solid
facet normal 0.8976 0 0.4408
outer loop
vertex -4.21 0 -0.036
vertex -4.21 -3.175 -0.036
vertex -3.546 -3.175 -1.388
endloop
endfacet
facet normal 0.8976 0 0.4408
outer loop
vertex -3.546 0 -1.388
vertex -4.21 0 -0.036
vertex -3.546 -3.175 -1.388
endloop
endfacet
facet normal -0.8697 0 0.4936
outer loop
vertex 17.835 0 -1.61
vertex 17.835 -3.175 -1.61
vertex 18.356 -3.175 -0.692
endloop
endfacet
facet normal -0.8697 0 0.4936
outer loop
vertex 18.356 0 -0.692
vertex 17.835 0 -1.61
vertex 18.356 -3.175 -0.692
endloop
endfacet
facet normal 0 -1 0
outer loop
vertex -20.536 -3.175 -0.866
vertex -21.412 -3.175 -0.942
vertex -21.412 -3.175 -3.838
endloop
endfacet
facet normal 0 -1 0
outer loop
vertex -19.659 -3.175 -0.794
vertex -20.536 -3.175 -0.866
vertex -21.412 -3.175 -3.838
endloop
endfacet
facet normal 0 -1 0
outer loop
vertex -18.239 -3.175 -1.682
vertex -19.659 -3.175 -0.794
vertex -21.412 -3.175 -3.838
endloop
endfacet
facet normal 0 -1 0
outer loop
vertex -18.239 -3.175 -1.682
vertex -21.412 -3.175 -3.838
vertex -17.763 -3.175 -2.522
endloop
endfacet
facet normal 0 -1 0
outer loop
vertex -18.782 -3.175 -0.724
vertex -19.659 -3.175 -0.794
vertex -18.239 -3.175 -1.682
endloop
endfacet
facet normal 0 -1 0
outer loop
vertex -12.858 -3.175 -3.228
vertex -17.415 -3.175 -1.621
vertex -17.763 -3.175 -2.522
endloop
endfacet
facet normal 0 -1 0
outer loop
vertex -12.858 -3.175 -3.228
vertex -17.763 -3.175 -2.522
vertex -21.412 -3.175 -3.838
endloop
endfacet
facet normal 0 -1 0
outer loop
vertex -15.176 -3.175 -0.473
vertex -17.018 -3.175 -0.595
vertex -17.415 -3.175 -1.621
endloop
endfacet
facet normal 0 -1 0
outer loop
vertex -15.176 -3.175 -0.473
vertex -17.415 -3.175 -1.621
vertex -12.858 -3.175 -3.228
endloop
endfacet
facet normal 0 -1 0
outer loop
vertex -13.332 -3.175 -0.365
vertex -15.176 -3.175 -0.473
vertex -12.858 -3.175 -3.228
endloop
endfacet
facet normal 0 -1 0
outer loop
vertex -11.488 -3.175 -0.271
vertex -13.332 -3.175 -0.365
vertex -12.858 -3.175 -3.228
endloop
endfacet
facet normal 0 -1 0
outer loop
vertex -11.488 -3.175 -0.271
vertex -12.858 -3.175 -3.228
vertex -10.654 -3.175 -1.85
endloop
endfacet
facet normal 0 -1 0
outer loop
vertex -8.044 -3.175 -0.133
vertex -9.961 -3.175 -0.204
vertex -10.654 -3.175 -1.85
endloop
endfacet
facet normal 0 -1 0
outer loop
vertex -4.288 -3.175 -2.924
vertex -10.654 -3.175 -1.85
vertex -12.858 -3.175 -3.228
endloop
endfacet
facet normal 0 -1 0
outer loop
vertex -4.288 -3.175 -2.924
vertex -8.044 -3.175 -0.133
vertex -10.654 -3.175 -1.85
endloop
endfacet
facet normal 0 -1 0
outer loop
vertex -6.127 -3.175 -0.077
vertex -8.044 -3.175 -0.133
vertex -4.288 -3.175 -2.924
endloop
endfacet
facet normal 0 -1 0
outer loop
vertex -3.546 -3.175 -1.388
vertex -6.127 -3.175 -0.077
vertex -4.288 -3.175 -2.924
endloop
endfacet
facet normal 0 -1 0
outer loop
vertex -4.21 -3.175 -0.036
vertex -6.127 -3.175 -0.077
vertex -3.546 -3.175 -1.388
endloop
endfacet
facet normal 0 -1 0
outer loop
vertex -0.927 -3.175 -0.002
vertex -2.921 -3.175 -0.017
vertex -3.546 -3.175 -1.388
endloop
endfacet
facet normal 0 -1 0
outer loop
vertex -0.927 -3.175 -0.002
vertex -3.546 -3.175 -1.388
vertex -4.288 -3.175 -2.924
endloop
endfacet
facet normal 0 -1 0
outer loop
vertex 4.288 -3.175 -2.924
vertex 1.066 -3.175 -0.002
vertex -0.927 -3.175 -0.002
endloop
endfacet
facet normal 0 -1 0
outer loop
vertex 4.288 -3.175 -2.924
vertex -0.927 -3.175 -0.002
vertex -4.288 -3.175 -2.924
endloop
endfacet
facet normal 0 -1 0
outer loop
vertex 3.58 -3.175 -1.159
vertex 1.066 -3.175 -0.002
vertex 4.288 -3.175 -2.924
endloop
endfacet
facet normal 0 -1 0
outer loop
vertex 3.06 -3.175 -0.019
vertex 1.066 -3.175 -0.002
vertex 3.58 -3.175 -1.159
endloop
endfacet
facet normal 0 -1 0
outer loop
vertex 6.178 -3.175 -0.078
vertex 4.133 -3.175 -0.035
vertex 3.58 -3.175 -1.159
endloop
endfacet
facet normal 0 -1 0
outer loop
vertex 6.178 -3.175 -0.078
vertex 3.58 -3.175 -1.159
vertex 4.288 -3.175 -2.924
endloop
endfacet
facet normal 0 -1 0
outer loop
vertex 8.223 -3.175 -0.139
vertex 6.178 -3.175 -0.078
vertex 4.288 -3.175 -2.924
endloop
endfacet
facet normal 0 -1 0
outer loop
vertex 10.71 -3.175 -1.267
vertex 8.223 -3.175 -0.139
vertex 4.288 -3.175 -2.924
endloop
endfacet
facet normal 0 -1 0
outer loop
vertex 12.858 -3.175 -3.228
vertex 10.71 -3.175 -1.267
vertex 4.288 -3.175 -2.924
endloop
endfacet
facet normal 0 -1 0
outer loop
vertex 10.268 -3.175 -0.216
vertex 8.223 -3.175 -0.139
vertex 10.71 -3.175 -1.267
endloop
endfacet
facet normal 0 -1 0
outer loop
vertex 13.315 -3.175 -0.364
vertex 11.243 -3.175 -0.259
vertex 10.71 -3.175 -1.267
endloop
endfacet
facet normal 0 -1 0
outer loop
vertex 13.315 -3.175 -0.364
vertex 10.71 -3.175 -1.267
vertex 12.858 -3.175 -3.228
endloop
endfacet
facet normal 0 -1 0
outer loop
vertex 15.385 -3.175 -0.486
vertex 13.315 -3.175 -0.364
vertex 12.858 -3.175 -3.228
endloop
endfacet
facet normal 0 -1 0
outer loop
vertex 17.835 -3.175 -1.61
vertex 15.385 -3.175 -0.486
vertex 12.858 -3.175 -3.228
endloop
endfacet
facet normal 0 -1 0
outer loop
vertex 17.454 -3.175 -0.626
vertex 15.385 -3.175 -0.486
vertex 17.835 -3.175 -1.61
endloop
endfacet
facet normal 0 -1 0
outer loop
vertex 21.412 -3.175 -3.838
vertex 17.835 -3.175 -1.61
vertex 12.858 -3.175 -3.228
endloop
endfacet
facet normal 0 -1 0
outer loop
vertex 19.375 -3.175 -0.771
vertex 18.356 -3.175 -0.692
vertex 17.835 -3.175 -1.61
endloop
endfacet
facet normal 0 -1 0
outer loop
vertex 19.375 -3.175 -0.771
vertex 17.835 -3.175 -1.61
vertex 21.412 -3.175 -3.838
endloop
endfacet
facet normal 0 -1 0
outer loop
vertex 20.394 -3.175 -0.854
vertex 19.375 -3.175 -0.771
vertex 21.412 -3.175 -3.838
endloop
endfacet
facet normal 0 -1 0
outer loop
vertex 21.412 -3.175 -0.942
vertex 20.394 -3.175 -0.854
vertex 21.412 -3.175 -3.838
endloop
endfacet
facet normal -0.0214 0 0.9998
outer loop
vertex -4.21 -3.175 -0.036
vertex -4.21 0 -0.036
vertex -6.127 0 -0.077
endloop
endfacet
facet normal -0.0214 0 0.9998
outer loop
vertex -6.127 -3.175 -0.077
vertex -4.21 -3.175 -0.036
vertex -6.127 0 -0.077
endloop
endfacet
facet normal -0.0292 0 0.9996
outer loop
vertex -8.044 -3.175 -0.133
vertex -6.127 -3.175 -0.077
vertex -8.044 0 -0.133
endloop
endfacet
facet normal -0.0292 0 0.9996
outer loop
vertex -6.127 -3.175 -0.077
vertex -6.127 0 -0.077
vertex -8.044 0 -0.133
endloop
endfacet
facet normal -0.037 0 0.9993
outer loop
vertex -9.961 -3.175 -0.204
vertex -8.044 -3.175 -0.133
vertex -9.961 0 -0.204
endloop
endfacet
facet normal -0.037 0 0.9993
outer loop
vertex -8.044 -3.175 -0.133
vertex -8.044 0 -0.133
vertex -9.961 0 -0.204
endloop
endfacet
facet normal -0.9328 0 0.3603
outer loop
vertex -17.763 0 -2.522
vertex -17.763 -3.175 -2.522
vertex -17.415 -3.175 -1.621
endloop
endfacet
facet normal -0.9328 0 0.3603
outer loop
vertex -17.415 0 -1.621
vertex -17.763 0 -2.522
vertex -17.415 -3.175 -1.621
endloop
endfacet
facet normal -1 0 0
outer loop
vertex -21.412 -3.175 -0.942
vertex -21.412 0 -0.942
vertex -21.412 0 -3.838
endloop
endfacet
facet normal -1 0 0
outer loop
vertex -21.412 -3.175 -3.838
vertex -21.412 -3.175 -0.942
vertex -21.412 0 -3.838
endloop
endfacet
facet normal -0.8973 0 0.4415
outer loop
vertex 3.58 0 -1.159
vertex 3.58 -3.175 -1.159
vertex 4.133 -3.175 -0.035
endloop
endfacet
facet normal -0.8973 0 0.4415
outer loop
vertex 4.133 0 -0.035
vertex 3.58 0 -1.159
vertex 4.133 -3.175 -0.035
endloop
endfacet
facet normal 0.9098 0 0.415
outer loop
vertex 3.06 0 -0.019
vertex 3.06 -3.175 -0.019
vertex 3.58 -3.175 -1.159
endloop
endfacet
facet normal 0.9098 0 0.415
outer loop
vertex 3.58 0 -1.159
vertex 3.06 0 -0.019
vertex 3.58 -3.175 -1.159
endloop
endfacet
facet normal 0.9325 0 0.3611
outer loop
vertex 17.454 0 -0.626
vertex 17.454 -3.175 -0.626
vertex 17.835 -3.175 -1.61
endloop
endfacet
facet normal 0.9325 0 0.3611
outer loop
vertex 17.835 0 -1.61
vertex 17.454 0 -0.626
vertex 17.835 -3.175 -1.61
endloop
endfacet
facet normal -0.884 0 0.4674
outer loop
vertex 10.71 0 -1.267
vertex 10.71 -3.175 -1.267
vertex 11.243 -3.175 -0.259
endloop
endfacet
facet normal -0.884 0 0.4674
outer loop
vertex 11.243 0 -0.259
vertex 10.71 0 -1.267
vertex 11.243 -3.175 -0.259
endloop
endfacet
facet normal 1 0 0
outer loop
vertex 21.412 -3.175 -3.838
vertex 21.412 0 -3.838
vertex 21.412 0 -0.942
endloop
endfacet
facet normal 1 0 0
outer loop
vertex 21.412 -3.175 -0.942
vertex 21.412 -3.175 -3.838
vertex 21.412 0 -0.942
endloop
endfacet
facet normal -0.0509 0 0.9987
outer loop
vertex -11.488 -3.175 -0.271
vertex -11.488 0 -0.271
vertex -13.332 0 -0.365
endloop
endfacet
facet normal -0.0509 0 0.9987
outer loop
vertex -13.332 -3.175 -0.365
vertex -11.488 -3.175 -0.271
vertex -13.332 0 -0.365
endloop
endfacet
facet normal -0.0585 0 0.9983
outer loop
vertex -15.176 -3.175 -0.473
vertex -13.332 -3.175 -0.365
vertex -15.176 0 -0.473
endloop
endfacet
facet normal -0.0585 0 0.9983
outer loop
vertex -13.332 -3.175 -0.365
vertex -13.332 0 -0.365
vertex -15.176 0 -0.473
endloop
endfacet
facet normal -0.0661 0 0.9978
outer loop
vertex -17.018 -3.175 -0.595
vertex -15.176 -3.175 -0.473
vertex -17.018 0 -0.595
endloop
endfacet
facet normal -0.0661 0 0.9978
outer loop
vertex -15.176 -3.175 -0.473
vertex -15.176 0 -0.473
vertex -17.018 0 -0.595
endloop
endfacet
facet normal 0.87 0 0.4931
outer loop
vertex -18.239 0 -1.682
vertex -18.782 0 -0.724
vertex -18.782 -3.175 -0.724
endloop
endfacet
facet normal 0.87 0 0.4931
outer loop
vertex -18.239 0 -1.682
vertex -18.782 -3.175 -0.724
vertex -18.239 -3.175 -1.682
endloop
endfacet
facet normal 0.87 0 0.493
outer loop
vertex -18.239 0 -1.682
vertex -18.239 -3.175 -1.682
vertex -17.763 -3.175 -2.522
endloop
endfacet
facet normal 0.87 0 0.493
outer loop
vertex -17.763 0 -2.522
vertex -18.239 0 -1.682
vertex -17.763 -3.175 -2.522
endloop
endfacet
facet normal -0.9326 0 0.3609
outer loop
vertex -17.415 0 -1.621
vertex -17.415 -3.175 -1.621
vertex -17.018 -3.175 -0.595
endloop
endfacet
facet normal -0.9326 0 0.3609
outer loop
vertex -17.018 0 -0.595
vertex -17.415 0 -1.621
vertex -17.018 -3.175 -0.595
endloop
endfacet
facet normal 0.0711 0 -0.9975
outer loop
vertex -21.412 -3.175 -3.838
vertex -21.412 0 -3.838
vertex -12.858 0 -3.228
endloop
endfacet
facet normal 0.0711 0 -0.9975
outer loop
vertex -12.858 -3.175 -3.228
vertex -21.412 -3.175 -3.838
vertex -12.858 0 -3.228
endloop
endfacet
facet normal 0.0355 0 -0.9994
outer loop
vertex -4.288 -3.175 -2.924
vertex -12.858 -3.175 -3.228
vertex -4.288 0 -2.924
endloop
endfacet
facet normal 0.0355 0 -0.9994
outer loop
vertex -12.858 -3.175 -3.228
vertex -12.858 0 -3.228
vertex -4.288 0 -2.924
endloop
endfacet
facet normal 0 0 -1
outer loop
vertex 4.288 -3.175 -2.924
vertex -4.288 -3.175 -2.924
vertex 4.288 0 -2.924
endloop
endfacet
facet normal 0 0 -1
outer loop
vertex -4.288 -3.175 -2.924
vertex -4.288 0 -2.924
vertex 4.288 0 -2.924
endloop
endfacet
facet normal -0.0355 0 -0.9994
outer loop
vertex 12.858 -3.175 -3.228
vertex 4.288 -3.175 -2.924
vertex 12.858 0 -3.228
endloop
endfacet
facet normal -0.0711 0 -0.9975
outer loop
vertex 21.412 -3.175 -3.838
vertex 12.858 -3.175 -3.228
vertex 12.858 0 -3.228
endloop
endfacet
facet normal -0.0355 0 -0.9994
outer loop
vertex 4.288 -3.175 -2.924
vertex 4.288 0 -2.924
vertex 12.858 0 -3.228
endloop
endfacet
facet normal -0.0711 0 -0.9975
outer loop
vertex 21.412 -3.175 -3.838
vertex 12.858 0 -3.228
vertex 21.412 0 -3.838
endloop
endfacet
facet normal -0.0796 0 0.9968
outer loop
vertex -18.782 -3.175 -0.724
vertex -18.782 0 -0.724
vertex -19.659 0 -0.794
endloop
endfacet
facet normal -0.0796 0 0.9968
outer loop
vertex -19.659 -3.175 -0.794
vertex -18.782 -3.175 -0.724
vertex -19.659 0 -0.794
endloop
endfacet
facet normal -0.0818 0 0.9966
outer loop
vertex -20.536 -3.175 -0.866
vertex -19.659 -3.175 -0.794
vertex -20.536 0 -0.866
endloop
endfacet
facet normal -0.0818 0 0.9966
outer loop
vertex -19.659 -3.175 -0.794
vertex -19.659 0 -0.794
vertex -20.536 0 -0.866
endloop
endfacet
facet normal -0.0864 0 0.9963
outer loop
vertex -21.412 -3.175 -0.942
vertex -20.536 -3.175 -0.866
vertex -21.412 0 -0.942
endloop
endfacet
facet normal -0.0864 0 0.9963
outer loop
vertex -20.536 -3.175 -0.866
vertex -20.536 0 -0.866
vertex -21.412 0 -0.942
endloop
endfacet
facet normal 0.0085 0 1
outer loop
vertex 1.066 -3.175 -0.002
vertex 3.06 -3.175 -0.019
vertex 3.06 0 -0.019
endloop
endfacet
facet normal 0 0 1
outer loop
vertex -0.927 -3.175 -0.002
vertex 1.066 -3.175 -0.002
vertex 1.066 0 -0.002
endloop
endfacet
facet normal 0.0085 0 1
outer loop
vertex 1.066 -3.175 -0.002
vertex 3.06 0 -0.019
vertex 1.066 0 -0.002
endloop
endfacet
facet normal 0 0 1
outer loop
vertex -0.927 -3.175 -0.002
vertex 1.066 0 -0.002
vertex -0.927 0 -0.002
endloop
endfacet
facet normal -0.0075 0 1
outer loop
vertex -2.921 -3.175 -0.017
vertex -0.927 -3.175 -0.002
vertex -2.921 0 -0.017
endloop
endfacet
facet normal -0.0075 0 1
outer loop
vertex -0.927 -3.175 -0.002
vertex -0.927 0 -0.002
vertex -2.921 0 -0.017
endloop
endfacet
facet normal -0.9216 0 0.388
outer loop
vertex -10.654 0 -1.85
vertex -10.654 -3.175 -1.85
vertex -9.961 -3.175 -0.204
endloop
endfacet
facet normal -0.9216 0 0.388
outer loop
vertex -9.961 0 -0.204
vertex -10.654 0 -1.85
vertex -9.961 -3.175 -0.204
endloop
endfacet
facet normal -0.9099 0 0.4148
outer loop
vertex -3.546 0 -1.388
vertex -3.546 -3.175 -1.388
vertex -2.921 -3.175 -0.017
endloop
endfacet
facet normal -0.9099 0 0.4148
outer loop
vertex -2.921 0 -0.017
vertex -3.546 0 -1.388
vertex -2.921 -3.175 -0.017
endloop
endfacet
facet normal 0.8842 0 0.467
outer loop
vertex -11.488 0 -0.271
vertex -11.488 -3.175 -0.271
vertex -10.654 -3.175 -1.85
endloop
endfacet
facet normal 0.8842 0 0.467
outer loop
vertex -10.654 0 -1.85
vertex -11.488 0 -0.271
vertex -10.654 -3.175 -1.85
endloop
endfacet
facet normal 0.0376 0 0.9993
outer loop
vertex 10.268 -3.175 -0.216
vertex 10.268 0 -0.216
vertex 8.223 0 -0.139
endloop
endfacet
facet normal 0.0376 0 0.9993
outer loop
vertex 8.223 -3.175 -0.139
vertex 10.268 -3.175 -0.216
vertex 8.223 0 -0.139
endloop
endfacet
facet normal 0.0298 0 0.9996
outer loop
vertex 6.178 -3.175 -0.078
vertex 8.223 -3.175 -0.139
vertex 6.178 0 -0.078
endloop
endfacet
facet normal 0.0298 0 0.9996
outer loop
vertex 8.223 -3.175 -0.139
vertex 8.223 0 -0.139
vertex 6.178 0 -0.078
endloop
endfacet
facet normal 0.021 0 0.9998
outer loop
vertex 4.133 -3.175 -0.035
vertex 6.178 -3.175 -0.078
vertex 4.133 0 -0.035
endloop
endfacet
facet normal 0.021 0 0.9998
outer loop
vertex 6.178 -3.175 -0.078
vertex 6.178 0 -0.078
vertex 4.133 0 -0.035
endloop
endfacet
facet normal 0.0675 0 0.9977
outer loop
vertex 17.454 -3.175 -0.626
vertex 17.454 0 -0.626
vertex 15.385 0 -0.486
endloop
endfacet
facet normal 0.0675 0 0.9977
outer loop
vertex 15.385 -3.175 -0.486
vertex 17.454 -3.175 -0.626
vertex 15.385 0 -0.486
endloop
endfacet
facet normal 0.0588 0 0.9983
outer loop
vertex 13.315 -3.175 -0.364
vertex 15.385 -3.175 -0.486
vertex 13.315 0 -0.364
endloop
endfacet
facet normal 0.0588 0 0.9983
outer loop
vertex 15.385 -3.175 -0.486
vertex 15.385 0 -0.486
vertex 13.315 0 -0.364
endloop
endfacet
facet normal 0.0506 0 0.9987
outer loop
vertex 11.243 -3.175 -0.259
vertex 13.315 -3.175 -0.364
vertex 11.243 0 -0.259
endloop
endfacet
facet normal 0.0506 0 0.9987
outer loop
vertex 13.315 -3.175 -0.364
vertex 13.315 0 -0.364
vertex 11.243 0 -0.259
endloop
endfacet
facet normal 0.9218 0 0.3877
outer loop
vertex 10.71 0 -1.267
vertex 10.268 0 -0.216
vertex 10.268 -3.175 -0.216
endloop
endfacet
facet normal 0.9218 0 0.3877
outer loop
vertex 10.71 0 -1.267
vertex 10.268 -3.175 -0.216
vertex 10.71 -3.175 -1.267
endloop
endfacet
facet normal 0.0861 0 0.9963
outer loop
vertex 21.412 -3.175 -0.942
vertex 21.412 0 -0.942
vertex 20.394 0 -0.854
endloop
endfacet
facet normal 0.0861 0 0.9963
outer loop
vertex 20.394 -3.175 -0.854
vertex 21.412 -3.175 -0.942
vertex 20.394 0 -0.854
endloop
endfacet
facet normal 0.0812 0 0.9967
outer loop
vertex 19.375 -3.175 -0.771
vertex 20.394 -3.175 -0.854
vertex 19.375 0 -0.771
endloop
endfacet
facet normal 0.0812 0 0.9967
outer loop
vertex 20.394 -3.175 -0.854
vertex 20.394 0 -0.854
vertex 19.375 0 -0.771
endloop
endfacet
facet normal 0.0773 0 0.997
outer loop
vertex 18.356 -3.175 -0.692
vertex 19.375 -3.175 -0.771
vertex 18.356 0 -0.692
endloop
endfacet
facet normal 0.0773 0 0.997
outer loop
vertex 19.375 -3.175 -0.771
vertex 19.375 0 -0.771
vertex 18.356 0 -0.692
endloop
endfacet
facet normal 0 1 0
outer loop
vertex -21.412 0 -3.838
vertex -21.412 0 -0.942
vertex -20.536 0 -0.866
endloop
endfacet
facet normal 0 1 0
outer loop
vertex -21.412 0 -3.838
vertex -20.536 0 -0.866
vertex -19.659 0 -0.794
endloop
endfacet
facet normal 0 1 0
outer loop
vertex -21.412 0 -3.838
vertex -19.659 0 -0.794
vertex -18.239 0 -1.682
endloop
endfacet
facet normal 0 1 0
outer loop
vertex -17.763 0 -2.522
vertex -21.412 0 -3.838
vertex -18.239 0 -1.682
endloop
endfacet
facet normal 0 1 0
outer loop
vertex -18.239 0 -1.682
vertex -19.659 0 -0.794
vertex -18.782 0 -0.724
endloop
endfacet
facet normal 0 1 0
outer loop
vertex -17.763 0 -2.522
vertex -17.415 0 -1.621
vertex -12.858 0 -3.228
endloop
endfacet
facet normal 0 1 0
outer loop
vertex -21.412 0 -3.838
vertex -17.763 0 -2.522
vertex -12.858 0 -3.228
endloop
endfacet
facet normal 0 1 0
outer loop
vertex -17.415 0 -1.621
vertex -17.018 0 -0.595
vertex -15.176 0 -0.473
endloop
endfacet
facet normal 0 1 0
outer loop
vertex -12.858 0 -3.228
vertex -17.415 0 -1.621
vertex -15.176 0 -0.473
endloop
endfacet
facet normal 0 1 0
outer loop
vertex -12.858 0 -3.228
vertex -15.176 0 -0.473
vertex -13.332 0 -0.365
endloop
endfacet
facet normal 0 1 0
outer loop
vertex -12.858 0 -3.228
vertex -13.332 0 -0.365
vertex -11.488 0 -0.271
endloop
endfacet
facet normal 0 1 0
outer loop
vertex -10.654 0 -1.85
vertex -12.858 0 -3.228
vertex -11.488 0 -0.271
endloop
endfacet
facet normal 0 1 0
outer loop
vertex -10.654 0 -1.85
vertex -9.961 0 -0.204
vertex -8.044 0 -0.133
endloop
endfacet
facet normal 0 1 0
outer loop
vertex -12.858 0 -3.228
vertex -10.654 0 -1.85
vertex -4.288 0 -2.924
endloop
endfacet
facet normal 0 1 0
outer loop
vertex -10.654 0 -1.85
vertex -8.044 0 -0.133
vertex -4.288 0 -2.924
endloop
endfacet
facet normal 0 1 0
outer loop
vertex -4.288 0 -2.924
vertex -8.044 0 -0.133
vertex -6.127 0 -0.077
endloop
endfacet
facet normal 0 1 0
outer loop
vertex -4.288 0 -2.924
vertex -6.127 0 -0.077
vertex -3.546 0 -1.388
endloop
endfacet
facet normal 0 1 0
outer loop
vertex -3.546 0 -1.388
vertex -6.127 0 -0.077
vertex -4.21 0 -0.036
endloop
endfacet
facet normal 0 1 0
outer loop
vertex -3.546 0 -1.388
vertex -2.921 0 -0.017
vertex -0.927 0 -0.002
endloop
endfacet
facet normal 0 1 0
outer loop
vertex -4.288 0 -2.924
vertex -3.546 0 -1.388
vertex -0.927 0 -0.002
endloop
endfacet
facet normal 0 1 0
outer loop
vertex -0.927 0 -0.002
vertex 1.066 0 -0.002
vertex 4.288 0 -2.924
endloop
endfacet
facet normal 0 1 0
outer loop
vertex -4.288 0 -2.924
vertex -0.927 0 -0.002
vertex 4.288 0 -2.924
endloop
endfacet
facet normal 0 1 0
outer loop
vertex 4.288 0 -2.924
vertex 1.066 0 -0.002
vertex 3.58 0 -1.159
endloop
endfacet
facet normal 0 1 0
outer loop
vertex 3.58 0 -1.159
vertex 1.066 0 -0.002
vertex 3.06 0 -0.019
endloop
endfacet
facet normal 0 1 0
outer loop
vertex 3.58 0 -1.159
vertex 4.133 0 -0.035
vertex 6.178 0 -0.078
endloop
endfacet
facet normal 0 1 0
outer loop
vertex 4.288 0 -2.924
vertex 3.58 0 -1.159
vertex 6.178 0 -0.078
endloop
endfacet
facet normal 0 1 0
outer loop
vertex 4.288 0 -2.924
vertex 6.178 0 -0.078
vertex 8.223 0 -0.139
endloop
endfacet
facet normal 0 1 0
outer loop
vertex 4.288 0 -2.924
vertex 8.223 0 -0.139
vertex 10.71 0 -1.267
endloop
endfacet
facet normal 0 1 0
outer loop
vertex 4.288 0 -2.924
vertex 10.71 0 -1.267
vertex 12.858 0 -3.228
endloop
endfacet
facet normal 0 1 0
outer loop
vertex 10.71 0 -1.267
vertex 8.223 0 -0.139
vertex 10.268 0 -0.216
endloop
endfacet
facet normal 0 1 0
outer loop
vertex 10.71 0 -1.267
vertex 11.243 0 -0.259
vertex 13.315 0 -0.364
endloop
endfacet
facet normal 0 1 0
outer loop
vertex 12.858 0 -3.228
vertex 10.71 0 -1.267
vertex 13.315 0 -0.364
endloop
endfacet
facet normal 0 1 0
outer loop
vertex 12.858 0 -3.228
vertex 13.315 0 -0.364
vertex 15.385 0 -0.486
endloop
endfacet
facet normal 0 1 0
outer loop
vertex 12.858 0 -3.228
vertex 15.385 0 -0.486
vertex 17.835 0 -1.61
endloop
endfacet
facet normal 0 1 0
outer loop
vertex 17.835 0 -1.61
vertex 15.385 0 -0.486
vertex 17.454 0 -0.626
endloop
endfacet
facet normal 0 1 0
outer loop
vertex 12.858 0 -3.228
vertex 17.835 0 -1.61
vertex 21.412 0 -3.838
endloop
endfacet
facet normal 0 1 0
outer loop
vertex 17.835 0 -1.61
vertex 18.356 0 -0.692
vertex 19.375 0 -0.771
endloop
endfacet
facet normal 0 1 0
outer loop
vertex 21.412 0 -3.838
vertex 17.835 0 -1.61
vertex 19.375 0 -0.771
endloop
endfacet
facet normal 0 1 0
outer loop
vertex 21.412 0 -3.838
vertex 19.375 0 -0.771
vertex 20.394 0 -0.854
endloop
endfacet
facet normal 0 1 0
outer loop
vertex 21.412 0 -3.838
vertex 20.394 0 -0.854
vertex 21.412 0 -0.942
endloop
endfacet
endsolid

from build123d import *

# Parameters (mm, degrees)
F2_DEPTH = 3.175
F4_DEPTH = 3.176


with BuildPart() as f2:
    # F1 (on Front) → F2 (new body)
    with BuildSketch(Plane.XZ):
        with BuildLine():
            Line((21.4122, -3.8375487704), (21.4122, -0.9419487704))
            ThreePointArc((21.4122, -0.9419487704), (0, 0), (-21.4122, -0.9419487704))
            Line((-21.4122, -0.9419487704), (-21.4122, -3.8375487704))
            ThreePointArc((-21.4122, -3.8375487704), (0, -2.8856456864), (21.4122, -3.8375487704))
        make_face()
    extrude(amount=F2_DEPTH)

    # F3 (on face) → F4 (cut, through all)
    with BuildSketch(Plane.XZ.offset(3.175)):
        with BuildLine():
            Line((-16.877150001, -0.2302185732), (-18.9748496265, -0.3844076014))
            Line((-18.9748496265, -0.3844076014), (-18.2392657349, -1.6819258763))
            ThreePointArc((-18.2392657349, -1.6819258763), (-17.9581295067, -1.0143624708), (-17.3843341446, -1.4564454512))
            ThreePointArc((-17.3843341446, -1.4564454512), (-17.3920934435, -1.5403197391), (-17.4151079687, -1.6213471081))
            Line((-17.4151079687, -1.6213471081), (-16.877150001, -0.2302185732))
        make_face()
        with BuildLine():
            ThreePointArc((-17.4151079687, -1.6213471081), (-17.808018602, -1.9124153497), (-18.2392657349, -1.6819258763))
            Line((-18.2392657349, -1.6819258763), (-17.7632411909, -2.5215997085))
            Line((-17.7632411909, -2.5215997085), (-17.4151079687, -1.6213471081))
        make_face()
        with BuildLine():
            ThreePointArc((-17.3843341446, -1.4564454512), (-17.9581295067, -1.0143624708), (-18.2392657349, -1.6819258763))
            ThreePointArc((-18.2392657349, -1.6819258763), (-17.808018602, -1.9124153497), (-17.4151079687, -1.6213471081))
            ThreePointArc((-17.4151079687, -1.6213471081), (-17.3920934435, -1.5403197391), (-17.3843341446, -1.4564454512))
        make_face()
        Polygon((-11.8018317816, 0.3221485882), (-10.6535149923, -1.8497062999), (-9.7005085696, 0.4146620143), align=None)
        Polygon((-4.6297261067, 0.8171098674), (-3.5456917006, -1.3875339838), (-2.5265922736, 0.8478678732), align=None)
        Polygon((2.5609041822, 1.0761222144), (3.5797209294, -1.1594084921), (4.6640341091, 1.0450982628), align=None)
        Polygon((9.7571629435, 0.9970667736), (10.709883024, -1.2674220323), (11.8584744402, 0.9042876313), align=None)
        Polygon((16.9491408118, 0.681489948), (17.8349422443, -1.6100032173), (19.046820923, 0.5270356622), align=None)
    extrude(amount=-F4_DEPTH, mode=Mode.SUBTRACT)


solid = f2.part
